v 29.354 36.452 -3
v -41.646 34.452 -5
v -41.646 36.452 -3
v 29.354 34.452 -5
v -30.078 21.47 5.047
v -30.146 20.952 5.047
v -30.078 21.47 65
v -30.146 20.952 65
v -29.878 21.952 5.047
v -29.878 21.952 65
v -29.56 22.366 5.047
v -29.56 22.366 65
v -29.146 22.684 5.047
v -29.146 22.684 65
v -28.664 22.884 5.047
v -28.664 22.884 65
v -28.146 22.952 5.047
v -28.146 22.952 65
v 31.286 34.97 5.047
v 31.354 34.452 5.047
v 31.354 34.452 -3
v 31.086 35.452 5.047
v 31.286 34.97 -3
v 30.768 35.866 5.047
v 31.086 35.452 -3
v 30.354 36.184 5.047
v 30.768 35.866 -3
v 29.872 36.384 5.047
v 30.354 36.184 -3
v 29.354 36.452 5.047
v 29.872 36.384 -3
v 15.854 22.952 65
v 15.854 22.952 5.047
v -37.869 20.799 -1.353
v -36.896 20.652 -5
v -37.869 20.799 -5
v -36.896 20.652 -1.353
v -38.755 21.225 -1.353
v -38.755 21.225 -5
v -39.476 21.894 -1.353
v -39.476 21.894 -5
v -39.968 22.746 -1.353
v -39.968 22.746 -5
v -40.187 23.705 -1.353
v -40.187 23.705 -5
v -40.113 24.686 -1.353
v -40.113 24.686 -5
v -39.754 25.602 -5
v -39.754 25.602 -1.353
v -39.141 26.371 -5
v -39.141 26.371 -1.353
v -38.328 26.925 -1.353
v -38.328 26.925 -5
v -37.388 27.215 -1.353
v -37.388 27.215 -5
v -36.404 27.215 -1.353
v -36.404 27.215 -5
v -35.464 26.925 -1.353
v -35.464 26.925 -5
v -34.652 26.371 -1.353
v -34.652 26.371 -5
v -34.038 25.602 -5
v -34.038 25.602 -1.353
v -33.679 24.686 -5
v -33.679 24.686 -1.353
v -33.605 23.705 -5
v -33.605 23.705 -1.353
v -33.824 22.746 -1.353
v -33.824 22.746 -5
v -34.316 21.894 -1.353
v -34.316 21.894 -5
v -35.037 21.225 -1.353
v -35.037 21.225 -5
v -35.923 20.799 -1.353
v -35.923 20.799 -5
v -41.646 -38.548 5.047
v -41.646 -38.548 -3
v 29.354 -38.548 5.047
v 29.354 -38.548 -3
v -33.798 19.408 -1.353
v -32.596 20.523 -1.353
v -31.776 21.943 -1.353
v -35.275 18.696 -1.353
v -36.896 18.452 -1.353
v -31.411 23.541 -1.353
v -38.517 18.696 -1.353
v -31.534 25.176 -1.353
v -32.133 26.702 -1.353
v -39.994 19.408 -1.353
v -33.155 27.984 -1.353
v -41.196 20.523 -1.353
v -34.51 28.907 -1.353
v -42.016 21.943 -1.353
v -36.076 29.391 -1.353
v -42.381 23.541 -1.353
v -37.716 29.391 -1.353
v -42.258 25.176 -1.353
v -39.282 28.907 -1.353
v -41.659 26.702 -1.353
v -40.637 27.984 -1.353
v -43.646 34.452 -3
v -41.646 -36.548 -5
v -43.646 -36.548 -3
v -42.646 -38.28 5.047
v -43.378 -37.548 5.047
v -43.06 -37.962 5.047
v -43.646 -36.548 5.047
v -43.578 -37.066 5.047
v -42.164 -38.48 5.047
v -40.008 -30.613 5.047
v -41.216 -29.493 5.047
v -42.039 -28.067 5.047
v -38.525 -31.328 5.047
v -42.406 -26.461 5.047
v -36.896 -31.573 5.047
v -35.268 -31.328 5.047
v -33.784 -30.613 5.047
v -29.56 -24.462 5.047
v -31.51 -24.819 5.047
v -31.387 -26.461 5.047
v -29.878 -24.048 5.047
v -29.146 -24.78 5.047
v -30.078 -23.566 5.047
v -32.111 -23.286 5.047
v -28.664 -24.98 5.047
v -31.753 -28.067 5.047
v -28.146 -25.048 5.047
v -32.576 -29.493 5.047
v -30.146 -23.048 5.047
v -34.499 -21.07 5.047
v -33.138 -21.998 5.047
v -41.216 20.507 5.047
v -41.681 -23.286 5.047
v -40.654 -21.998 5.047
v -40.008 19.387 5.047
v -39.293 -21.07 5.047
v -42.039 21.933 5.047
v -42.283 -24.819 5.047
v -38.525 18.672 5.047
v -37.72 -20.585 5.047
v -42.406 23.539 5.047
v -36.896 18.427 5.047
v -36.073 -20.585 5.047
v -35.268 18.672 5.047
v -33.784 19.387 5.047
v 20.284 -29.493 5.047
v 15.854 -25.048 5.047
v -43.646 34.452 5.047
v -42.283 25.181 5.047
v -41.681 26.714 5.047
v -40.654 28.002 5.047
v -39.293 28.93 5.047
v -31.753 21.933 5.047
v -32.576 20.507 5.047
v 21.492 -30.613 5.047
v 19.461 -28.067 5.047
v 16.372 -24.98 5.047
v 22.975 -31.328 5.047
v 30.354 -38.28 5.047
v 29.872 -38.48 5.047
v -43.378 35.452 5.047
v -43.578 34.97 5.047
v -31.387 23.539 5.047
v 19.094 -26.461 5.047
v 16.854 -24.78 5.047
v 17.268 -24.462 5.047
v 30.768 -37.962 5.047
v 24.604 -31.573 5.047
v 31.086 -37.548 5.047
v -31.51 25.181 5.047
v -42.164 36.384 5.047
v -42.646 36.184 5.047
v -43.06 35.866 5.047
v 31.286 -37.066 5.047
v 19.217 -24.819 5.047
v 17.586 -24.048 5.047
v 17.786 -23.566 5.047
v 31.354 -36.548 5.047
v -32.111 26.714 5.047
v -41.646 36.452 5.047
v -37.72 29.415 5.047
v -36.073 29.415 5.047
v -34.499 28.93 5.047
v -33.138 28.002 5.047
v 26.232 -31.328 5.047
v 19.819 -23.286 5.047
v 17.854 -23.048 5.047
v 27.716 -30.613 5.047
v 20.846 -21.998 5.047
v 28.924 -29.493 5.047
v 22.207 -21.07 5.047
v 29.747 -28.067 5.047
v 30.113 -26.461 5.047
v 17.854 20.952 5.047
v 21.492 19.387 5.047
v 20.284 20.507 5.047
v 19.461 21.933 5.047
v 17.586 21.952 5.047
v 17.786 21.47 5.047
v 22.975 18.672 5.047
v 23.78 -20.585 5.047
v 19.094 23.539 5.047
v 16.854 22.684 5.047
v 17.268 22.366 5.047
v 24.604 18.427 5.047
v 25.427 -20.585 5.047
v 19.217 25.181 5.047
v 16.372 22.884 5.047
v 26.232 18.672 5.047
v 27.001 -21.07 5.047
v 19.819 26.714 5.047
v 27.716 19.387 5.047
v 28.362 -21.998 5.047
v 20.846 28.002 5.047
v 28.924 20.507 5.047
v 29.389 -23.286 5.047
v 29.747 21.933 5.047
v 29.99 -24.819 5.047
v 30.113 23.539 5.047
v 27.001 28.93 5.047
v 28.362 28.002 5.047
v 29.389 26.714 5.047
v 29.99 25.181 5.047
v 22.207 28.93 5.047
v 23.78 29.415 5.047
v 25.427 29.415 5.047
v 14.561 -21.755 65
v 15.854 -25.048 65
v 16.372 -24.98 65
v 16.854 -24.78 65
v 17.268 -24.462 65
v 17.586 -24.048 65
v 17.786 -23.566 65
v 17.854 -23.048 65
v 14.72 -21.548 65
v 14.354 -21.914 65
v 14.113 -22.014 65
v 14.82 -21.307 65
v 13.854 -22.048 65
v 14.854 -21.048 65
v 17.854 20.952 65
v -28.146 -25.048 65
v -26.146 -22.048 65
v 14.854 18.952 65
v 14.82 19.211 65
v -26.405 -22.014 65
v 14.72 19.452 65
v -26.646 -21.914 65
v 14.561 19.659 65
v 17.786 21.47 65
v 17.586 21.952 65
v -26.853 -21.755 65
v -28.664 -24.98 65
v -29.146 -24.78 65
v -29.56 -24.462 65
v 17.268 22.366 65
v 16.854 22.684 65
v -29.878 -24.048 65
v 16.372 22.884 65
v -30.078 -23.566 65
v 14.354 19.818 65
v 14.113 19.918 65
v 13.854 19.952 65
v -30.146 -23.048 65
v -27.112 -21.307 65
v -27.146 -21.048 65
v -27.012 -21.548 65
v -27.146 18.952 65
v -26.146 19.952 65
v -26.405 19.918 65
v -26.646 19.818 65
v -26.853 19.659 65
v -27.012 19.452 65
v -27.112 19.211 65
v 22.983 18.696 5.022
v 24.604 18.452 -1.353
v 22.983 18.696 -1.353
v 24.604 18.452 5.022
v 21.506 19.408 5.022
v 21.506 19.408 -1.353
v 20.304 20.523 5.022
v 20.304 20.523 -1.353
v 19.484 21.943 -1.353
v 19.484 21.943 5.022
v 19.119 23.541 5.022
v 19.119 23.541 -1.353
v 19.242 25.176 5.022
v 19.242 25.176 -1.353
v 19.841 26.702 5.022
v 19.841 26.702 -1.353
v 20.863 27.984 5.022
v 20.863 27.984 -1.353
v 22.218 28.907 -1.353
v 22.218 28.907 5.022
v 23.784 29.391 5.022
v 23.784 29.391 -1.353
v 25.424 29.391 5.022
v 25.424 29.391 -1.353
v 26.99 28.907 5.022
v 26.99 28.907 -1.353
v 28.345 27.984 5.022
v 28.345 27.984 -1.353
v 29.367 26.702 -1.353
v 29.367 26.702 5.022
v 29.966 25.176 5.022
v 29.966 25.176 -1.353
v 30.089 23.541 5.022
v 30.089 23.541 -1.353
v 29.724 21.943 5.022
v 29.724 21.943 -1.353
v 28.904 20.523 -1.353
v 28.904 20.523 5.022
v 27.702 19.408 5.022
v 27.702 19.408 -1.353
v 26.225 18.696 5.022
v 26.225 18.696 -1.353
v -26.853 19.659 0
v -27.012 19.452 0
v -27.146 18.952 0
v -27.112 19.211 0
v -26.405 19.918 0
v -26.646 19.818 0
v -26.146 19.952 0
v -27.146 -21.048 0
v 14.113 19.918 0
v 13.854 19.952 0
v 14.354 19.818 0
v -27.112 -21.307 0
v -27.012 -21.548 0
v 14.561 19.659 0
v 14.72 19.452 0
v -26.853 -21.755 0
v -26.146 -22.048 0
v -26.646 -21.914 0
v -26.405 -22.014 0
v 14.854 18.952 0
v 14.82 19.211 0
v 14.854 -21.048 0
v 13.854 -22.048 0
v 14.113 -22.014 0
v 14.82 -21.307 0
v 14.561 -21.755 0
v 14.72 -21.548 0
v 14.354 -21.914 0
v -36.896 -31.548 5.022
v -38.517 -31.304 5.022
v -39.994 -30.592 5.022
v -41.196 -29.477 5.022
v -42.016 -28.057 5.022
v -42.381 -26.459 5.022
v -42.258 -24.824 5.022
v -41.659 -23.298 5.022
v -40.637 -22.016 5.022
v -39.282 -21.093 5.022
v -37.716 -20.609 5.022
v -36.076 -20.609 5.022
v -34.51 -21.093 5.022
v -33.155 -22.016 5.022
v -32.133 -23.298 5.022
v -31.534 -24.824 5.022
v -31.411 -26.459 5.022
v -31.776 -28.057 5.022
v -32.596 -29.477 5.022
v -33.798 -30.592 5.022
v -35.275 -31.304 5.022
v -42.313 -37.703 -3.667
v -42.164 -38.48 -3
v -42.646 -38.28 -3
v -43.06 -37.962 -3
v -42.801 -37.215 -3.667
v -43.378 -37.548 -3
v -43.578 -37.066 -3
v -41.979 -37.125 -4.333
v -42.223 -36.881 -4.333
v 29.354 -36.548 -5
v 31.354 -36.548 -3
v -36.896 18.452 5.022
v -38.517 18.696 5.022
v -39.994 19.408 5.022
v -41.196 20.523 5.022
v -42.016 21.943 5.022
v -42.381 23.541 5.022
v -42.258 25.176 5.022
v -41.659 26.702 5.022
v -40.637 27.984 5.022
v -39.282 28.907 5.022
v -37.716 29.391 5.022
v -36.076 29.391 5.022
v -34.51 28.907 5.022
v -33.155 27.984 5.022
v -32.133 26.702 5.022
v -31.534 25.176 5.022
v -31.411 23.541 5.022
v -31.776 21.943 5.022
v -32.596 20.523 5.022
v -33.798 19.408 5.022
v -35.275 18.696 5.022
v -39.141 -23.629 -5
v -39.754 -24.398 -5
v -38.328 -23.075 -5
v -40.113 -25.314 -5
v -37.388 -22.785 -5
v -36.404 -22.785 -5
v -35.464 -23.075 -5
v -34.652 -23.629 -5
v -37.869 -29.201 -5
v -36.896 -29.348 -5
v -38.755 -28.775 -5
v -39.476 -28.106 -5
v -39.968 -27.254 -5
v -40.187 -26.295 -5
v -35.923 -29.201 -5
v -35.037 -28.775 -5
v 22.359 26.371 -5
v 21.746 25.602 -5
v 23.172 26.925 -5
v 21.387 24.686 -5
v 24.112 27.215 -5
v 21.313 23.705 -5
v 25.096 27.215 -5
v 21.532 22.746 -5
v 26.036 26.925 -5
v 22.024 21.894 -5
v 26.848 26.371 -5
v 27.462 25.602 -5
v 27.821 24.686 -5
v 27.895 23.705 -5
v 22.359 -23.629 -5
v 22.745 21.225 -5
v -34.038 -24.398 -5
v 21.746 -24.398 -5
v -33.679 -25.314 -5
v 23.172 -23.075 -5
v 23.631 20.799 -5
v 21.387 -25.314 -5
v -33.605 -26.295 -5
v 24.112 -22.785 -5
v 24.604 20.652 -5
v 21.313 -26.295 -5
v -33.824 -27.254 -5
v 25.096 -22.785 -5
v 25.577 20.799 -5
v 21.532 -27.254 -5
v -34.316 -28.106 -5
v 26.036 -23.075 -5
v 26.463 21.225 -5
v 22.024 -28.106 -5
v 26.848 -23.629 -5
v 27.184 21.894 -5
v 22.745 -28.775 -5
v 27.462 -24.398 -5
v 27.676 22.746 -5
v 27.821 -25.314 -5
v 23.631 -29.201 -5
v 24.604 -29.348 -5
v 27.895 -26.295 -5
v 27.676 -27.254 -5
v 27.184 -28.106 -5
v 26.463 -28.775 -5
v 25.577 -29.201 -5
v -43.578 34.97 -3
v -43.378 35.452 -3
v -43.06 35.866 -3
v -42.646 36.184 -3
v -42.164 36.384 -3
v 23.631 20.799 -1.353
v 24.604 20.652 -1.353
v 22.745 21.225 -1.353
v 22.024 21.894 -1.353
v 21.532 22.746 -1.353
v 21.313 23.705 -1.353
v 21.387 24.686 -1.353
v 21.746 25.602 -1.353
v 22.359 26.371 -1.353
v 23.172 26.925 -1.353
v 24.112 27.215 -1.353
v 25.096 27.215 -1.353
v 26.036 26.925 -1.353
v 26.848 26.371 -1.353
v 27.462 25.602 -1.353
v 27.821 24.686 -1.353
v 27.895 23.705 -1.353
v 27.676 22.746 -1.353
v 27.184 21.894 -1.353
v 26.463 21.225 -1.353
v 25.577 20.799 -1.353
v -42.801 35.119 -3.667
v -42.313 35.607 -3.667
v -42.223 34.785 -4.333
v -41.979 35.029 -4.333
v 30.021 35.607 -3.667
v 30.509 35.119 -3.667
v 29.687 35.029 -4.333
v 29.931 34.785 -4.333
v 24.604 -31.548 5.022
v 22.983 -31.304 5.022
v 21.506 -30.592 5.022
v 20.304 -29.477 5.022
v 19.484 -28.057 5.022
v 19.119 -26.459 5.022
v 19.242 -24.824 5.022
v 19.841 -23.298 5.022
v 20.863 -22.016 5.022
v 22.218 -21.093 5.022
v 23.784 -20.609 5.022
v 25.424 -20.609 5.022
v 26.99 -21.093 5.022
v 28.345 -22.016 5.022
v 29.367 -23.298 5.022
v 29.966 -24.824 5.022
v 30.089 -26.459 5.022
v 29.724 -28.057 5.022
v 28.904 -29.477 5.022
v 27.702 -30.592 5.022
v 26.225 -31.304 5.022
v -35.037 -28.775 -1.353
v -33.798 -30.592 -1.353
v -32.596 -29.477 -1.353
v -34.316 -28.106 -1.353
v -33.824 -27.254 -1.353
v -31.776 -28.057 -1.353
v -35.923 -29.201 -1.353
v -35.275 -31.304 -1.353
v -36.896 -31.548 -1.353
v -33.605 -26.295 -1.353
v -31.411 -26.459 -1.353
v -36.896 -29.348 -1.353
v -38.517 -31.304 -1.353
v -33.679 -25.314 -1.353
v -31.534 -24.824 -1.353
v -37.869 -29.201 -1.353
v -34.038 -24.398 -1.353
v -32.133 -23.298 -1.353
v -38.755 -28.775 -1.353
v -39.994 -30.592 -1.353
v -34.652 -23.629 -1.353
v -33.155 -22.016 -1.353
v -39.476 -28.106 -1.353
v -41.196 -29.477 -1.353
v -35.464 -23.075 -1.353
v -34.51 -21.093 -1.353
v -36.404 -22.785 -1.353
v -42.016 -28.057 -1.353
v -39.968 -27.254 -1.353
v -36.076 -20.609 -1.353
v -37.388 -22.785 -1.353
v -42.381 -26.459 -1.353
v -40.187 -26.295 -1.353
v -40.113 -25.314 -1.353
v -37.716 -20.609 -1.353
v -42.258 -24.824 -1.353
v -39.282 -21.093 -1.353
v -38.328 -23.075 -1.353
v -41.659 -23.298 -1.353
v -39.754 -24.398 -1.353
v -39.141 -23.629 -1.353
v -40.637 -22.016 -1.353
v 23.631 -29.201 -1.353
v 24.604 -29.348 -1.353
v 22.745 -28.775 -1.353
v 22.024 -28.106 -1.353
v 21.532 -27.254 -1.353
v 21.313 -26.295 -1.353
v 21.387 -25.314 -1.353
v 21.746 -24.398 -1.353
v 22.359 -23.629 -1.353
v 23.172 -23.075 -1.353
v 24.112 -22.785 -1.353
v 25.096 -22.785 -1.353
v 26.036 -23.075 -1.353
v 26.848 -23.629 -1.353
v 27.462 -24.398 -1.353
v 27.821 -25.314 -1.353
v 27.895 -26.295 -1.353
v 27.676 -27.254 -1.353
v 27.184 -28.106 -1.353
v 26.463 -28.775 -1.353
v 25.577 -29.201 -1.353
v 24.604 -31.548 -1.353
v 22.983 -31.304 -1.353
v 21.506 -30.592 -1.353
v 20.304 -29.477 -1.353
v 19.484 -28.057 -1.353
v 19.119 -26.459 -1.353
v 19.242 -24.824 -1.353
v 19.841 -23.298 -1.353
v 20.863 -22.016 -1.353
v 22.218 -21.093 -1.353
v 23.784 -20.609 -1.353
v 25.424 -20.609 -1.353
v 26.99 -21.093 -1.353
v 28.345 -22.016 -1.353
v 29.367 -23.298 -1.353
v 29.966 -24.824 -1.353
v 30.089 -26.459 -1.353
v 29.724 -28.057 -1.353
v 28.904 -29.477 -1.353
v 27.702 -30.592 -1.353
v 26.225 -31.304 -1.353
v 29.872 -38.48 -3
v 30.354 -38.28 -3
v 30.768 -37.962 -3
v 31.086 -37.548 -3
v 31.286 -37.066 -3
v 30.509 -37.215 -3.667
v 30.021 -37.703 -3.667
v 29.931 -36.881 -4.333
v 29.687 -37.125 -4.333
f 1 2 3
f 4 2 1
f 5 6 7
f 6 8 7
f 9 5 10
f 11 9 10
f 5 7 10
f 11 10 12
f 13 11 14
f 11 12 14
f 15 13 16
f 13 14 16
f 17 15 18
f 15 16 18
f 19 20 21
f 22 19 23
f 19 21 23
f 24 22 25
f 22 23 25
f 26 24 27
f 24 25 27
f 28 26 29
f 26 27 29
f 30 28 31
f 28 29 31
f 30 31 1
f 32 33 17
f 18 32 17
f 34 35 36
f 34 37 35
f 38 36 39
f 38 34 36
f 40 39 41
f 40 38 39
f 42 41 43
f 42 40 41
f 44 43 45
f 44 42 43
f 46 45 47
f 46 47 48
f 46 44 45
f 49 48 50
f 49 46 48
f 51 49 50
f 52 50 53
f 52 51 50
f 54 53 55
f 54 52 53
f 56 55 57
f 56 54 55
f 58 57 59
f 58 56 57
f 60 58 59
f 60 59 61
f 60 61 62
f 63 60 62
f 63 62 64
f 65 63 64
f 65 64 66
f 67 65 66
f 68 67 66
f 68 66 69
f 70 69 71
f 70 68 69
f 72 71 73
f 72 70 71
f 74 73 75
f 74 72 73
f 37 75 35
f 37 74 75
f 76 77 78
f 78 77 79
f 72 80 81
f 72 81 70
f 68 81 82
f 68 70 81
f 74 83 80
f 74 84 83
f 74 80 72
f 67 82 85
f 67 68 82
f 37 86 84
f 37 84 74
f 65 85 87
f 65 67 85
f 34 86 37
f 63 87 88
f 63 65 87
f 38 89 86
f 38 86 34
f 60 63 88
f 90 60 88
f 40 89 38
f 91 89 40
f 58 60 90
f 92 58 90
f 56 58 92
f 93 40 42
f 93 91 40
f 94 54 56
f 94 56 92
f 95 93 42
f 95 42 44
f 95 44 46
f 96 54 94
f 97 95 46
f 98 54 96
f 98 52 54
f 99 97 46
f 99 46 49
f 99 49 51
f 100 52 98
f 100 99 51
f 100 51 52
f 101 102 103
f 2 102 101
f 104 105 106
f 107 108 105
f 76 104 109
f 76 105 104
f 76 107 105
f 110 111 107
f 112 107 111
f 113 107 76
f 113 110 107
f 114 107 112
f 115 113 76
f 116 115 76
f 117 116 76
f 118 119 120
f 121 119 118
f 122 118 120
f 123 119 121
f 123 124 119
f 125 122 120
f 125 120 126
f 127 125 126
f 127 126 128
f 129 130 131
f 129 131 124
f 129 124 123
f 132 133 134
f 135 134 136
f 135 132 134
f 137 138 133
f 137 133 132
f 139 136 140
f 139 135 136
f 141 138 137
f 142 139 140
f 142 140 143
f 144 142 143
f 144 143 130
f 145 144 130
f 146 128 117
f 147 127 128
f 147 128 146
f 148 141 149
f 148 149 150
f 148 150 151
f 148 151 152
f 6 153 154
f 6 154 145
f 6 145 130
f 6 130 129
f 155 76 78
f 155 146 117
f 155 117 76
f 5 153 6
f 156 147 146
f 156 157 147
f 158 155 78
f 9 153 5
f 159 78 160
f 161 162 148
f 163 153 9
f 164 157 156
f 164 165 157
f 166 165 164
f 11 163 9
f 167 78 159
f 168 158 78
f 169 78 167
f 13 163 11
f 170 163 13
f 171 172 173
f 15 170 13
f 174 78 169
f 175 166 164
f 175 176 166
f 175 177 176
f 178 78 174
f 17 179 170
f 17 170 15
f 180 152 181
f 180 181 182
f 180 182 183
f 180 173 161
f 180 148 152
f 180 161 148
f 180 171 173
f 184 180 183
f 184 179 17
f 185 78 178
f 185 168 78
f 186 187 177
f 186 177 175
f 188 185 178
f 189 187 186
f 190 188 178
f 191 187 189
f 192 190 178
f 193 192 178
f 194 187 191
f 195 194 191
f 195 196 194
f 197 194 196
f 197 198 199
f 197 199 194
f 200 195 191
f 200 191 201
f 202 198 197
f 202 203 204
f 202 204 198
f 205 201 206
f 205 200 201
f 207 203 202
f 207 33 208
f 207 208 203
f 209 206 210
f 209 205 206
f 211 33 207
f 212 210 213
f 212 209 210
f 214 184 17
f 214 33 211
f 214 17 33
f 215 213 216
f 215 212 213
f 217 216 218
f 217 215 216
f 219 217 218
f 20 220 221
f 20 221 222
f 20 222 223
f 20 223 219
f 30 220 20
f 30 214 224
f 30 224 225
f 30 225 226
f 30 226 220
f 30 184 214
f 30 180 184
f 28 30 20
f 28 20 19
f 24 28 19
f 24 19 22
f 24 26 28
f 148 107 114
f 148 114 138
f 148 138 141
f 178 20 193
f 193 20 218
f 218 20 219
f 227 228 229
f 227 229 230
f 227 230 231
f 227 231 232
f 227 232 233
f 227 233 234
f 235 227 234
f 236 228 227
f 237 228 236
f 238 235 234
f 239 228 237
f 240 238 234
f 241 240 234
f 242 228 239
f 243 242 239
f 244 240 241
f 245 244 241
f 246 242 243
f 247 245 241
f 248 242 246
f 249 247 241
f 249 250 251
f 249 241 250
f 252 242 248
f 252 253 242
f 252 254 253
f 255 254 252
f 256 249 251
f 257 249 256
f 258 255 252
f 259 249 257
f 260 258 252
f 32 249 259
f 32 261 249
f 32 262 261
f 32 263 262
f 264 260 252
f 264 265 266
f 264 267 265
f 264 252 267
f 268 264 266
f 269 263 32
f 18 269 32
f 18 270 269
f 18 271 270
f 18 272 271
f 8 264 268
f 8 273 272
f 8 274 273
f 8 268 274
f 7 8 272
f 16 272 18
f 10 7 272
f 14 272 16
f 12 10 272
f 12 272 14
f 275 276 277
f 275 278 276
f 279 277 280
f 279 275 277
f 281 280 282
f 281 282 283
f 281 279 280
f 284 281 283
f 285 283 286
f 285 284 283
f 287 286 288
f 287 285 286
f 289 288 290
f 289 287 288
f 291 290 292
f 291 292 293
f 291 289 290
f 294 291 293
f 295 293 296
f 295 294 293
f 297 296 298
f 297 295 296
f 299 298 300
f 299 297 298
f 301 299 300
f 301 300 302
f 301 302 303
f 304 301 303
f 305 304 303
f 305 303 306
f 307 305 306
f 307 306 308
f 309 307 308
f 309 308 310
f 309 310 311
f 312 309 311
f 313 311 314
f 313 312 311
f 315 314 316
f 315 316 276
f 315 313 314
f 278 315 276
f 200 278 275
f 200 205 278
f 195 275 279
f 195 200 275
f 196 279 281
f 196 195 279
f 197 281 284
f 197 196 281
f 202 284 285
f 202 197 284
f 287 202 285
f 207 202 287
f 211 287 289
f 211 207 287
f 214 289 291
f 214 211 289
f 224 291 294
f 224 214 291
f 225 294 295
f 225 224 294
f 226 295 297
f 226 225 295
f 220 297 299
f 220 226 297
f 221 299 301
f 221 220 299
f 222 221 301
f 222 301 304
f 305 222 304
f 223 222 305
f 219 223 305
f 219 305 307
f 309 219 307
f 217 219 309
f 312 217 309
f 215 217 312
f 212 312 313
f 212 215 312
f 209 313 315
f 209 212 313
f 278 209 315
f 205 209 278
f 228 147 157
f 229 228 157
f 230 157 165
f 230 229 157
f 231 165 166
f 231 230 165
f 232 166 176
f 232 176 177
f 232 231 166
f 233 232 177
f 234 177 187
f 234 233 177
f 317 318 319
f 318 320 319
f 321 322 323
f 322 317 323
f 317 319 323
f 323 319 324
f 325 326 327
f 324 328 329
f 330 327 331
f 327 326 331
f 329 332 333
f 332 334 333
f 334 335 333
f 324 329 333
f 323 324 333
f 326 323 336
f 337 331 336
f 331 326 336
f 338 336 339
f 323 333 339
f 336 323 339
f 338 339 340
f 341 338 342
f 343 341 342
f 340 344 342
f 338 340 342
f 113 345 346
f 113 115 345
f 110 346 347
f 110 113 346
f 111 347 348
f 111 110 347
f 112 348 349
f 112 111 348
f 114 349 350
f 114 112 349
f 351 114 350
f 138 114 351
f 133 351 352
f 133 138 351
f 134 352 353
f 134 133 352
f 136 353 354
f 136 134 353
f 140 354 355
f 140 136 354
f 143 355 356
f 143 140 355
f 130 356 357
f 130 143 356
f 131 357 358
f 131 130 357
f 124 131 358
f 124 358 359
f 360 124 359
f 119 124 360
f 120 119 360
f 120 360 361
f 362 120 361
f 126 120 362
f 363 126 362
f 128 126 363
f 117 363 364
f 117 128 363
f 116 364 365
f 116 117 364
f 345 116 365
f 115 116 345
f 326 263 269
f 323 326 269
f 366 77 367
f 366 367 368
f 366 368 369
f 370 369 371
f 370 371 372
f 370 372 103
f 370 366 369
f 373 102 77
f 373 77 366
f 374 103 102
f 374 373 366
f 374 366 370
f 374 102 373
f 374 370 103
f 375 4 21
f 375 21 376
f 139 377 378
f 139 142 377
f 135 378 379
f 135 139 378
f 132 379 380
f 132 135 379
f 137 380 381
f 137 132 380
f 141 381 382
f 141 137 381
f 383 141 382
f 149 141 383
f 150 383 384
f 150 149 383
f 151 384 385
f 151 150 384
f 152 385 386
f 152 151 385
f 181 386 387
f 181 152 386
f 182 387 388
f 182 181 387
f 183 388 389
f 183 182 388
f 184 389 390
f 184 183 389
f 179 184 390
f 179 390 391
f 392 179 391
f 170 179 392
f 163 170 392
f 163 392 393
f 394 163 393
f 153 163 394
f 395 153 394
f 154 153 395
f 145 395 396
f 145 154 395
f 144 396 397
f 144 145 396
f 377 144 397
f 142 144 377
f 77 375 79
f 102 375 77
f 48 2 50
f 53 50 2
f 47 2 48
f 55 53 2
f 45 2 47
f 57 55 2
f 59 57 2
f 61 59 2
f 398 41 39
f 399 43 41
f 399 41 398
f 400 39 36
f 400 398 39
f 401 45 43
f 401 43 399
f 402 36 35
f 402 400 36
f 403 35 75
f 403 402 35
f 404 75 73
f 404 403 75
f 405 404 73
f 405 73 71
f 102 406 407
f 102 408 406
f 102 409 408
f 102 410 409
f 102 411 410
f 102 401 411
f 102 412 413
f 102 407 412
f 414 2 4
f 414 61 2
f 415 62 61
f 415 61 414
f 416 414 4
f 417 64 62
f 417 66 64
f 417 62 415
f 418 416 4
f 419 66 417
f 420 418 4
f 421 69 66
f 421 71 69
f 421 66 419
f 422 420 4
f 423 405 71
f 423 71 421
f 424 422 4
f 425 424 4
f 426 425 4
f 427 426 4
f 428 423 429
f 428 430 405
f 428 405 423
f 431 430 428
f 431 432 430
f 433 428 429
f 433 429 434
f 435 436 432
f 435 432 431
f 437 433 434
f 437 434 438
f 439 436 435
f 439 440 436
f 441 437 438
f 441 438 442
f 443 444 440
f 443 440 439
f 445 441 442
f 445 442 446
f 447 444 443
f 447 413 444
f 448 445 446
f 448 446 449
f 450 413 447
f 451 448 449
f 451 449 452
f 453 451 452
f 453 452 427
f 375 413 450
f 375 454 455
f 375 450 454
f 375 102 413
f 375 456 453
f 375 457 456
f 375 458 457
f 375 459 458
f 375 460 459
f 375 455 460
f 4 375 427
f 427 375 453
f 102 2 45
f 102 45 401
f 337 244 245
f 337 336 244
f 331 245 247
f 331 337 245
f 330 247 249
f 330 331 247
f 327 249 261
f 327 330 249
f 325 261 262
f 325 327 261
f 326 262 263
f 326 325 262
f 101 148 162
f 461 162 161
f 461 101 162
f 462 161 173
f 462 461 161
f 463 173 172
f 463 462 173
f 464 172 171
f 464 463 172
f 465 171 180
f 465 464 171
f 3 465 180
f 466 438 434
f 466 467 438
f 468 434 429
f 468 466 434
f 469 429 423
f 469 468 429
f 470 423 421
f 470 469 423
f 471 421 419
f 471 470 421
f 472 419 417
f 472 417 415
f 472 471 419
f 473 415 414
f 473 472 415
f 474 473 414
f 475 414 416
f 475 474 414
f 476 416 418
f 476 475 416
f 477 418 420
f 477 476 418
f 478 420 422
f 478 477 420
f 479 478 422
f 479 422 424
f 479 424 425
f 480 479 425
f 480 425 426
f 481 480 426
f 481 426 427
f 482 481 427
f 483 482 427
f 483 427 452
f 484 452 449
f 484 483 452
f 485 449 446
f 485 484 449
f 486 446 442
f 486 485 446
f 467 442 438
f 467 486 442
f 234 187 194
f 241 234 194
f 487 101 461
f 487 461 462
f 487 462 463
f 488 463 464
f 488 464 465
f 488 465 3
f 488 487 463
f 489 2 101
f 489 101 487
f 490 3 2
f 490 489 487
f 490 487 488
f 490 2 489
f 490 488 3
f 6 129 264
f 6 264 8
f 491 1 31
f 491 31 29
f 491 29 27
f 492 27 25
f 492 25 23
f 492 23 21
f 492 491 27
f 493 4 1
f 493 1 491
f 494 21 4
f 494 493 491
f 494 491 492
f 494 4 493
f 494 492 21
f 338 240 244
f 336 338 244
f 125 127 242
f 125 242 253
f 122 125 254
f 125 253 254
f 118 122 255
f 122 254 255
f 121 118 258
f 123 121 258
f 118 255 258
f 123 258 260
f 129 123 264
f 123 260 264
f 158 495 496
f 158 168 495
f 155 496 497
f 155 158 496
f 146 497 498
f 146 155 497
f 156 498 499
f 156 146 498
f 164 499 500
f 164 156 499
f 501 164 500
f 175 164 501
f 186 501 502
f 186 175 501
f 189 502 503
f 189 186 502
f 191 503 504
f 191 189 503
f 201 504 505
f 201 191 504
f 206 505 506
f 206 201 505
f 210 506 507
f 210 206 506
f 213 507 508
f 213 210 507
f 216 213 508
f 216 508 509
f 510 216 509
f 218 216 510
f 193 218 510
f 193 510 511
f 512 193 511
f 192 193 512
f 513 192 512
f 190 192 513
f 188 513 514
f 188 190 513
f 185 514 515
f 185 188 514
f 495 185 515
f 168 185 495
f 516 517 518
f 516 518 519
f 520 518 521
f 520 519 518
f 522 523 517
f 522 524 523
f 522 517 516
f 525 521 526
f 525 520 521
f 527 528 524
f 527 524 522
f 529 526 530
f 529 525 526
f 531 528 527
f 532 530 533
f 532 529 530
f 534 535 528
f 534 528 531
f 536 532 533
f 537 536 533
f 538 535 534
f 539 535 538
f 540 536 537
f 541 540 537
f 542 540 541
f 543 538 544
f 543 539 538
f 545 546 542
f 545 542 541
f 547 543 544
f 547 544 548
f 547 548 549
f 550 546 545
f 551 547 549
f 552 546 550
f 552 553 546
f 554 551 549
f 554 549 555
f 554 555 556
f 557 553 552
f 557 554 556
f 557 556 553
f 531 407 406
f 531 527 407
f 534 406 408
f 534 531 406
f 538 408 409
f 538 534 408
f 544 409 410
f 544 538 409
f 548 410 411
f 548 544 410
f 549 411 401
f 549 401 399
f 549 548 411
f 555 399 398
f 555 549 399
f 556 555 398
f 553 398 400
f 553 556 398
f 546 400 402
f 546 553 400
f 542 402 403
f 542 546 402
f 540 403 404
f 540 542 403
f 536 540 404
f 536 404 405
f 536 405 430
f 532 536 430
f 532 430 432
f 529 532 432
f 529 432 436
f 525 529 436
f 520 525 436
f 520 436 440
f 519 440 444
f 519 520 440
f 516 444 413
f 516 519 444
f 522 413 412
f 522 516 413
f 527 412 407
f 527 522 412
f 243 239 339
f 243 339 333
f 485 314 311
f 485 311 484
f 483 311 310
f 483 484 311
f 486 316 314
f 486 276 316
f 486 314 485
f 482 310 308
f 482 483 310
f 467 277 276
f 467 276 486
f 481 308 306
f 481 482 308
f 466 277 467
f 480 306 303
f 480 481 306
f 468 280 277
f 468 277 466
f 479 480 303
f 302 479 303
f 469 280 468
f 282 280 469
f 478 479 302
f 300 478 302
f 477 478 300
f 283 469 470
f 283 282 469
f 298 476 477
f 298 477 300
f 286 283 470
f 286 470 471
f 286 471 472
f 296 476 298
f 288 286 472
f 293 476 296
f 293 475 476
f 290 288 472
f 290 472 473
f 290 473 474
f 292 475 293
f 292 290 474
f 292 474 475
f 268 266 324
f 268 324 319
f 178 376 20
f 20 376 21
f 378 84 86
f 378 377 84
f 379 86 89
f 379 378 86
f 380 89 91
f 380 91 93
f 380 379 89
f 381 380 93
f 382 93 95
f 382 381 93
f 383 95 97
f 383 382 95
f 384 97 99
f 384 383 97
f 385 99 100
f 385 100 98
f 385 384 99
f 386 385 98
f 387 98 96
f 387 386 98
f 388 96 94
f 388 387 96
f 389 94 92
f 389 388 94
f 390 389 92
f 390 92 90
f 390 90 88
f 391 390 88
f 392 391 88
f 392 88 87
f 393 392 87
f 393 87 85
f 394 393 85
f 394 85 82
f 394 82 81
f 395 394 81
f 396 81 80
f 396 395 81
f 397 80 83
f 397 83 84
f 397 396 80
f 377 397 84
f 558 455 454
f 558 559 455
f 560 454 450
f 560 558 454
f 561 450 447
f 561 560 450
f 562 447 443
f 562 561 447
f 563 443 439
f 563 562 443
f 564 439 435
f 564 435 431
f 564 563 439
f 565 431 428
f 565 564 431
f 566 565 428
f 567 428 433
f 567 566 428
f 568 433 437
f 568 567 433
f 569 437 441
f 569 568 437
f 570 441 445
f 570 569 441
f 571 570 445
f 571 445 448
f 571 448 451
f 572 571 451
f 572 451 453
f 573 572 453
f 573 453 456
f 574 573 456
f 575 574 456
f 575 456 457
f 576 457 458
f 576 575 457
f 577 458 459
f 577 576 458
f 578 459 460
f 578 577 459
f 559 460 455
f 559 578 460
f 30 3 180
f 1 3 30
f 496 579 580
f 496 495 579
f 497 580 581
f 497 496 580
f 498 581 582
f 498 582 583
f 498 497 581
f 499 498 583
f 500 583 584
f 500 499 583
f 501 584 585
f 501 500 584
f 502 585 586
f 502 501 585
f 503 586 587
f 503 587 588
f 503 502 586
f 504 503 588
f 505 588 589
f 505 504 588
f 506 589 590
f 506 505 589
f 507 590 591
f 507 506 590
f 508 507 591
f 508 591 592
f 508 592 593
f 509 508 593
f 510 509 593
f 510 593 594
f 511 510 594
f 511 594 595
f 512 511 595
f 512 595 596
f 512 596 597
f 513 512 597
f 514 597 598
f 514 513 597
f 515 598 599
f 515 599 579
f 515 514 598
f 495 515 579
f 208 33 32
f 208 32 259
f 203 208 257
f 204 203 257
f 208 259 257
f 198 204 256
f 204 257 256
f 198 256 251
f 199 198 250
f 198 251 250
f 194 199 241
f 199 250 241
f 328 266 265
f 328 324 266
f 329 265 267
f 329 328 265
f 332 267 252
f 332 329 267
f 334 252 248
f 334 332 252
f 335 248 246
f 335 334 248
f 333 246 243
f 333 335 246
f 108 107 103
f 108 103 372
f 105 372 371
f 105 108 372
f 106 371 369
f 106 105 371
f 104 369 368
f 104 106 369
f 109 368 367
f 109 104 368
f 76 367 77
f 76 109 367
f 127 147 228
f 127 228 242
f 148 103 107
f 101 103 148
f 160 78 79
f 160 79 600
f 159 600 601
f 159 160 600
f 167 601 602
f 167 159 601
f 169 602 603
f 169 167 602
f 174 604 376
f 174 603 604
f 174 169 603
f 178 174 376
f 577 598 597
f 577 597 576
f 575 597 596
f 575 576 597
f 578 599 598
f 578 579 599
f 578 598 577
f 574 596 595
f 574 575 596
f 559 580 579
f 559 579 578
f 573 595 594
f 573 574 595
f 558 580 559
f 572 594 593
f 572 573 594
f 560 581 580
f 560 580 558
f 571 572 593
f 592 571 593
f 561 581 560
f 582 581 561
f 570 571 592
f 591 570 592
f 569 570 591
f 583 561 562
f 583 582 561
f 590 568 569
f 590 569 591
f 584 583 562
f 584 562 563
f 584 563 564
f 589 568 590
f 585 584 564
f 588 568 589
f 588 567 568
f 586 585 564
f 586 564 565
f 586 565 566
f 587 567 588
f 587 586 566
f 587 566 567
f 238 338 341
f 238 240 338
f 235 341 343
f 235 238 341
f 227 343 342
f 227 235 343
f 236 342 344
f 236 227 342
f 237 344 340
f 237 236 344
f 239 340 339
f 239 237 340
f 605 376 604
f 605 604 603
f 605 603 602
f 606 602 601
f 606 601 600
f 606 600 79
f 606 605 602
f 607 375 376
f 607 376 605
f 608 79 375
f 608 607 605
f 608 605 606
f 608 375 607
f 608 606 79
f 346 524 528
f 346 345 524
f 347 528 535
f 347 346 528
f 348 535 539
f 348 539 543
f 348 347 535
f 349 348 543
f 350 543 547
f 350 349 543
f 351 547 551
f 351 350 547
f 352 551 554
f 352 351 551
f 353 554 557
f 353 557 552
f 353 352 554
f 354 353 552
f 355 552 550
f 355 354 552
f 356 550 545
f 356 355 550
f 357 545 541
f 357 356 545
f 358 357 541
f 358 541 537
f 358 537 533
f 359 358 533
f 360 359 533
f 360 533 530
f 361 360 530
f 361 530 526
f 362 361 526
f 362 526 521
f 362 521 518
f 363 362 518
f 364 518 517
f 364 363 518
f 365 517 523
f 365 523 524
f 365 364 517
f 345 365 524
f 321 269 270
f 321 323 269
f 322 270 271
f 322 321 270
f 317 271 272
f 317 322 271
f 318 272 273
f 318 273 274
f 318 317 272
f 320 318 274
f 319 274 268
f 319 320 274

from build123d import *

# Parameters (mm, degrees)
SKETCH1_W                                    = 48
SKETCH1_H                                    = 48
SKETCH1_W_2                                  = 42
SKETCH1_H_2                                  = 42
BOSS_EXTRUDE1_DEPTH                          = 65
SKETCH3_W                                    = 75
SKETCH3_H                                    = 75
BOSS_EXTRUDE2_DEPTH                          = 5
SKETCH8_W                                    = 75
SKETCH8_H                                    = 75
SKETCH8_W_2                                  = 42
SKETCH8_H_2                                  = 42
BOSS_EXTRUDE3_DEPTH                          = 5.047079132
FILLET1_R                                    = 2
CBORE_FOR_M6_HEX_SOCKET_HEAD_CAP_SCR_2_COUNT = 2
CBORE_FOR_M6_HEX_SOCKET_HEAD_CAP_SCR_2_PITCH = 50
CBORE_FOR_M6_HEX_SOCKET_HEAD_CAP_SCR_3_COUNT = 2
CBORE_FOR_M6_HEX_SOCKET_HEAD_CAP_SCR_3_PITCH = 61.5
CBORE_FOR_M6_HEX_SOCKET_HEAD_CAP_SCR_4_COUNT = 2
CBORE_FOR_M6_HEX_SOCKET_HEAD_CAP_SCR_4_PITCH = 79.260645973
FILLET2_R                                    = 1
CHAMFER1_SIZE                                = 2


with BuildPart() as part:
    # Sketch1 → Boss-Extrude1 (new body)
    with BuildSketch(Plane(origin=(0, 0, 0), x_dir=(0, 1, 0), z_dir=(0, 0, 1))):
        with Locations((-1.048003873, 6.146094376)):
            Rectangle(SKETCH1_W, SKETCH1_H)
        with Locations((-1.048003873, 6.146094376)):
            Rectangle(SKETCH1_W_2, SKETCH1_H_2, mode=Mode.SUBTRACT)
    extrude(amount=BOSS_EXTRUDE1_DEPTH)

    # Sketch3 → Boss-Extrude2 (add)
    with BuildSketch(Plane(origin=(0, 0, 0), x_dir=(1, 0, 0), z_dir=(0, 0, -1))):
        with Locations((-6.146094376, 1.048003873)):
            Rectangle(SKETCH3_W, SKETCH3_H)
    extrude(amount=BOSS_EXTRUDE2_DEPTH)

    # Sketch8 → Boss-Extrude3 (add)
    with BuildSketch(Plane.XY):
        with Locations((-6.146094376, -1.048003873)):
            Rectangle(SKETCH8_W, SKETCH8_H)
        with Locations((-6.146094376, -1.048003873)):
            Rectangle(SKETCH8_W_2, SKETCH8_H_2, mode=Mode.SUBTRACT)
    extrude(amount=BOSS_EXTRUDE3_DEPTH)

    # Fillet1
    fillet1_edges = [part.edges().sort_by_distance(p)[0] for p in [
        (17.853905624, 22.951996127, 35.023539566),
        (17.853905624, -25.048003873, 35.023539566),
        (-30.146094376, -25.048003873, 35.023539566),
        (-30.146094376, 22.951996127, 35.023539566),
        (-43.646094376, -38.548003873, 0.023539566),
        (31.353905624, -38.548003873, 0.023539566),
        (31.353905624, 36.451996127, 0.023539566),
        (-43.646094376, 36.451996127, 0.023539566),
    ]]
    fillet(fillet1_edges, radius=FILLET1_R)

    # Sketch15 → CBORE for M6 Hex Socket Head Cap Screw2 (revolve, cut)
    with BuildSketch(Plane(origin=(-36.896094376, 23.951996127, 5.047079132), x_dir=(0, -1, 0), z_dir=(1, 0, 0))):
        Polygon((0, 0), (0, 10.047079132), (3.3, 10.047079132), (3.3, 6.4), (5.5, 6.4), (5.5, 0.025), (5.525, 0), align=None)
    cbore_for_m6_hex_socket_head_cap_screw2 = revolve(axis=Axis((-36.896094376, 23.951996127, 11.397079132), (0, 0, -1)), mode=Mode.SUBTRACT)

    # CBORE for M6 Hex Socket Head Cap Scr 2: CBORE for M6 Hex Socket Head Cap Screw2 ×2
    with Locations(*[(0, -i * CBORE_FOR_M6_HEX_SOCKET_HEAD_CAP_SCR_2_PITCH, 0) for i in range(1, CBORE_FOR_M6_HEX_SOCKET_HEAD_CAP_SCR_2_COUNT)]):
        add(cbore_for_m6_hex_socket_head_cap_screw2, mode=Mode.SUBTRACT)

    # CBORE for M6 Hex Socket Head Cap Scr 3: CBORE for M6 Hex Socket Head Cap Screw2 ×2
    with Locations(*[(i * CBORE_FOR_M6_HEX_SOCKET_HEAD_CAP_SCR_3_PITCH, 0, 0) for i in range(1, CBORE_FOR_M6_HEX_SOCKET_HEAD_CAP_SCR_3_COUNT)]):
        add(cbore_for_m6_hex_socket_head_cap_screw2, mode=Mode.SUBTRACT)

    # CBORE for M6 Hex Socket Head Cap Scr 4: CBORE for M6 Hex Socket Head Cap Screw2 ×2
    with Locations(*[Vector(0.7759210039901774, -0.63083008454486, 0) * (i * CBORE_FOR_M6_HEX_SOCKET_HEAD_CAP_SCR_4_PITCH) for i in range(1, CBORE_FOR_M6_HEX_SOCKET_HEAD_CAP_SCR_4_COUNT)]):
        add(cbore_for_m6_hex_socket_head_cap_screw2, mode=Mode.SUBTRACT)

    # Fillet2
    fillet2_edges = [part.edges().sort_by_distance(p)[0] for p in [
        (14.853905624, -22.048003873, 32.5),
        (14.853905624, 19.951996127, 32.5),
        (-27.146094376, 19.951996127, 32.5),
        (-27.146094376, -22.048003873, 32.5),
    ]]
    fillet(fillet2_edges, radius=FILLET2_R)

    # Chamfer1
    chamfer1_edges = [part.edges().sort_by_distance(p)[0] for p in [
        (-6.146094376, 36.451996127, -5),
        (-6.146094376, -38.548003873, -5),
        (-43.646094376, -1.048003873, -5),
        (30.768119187, -37.962217436, -5),
        (-43.060307938, -37.962217436, -5),
        (-43.060307938, 35.866209689, -5),
        (30.768119187, 35.866209689, -5),
        (31.353905624, -1.048003873, -5),
    ]]
    chamfer(chamfer1_edges, length=CHAMFER1_SIZE)


solid = part.part
